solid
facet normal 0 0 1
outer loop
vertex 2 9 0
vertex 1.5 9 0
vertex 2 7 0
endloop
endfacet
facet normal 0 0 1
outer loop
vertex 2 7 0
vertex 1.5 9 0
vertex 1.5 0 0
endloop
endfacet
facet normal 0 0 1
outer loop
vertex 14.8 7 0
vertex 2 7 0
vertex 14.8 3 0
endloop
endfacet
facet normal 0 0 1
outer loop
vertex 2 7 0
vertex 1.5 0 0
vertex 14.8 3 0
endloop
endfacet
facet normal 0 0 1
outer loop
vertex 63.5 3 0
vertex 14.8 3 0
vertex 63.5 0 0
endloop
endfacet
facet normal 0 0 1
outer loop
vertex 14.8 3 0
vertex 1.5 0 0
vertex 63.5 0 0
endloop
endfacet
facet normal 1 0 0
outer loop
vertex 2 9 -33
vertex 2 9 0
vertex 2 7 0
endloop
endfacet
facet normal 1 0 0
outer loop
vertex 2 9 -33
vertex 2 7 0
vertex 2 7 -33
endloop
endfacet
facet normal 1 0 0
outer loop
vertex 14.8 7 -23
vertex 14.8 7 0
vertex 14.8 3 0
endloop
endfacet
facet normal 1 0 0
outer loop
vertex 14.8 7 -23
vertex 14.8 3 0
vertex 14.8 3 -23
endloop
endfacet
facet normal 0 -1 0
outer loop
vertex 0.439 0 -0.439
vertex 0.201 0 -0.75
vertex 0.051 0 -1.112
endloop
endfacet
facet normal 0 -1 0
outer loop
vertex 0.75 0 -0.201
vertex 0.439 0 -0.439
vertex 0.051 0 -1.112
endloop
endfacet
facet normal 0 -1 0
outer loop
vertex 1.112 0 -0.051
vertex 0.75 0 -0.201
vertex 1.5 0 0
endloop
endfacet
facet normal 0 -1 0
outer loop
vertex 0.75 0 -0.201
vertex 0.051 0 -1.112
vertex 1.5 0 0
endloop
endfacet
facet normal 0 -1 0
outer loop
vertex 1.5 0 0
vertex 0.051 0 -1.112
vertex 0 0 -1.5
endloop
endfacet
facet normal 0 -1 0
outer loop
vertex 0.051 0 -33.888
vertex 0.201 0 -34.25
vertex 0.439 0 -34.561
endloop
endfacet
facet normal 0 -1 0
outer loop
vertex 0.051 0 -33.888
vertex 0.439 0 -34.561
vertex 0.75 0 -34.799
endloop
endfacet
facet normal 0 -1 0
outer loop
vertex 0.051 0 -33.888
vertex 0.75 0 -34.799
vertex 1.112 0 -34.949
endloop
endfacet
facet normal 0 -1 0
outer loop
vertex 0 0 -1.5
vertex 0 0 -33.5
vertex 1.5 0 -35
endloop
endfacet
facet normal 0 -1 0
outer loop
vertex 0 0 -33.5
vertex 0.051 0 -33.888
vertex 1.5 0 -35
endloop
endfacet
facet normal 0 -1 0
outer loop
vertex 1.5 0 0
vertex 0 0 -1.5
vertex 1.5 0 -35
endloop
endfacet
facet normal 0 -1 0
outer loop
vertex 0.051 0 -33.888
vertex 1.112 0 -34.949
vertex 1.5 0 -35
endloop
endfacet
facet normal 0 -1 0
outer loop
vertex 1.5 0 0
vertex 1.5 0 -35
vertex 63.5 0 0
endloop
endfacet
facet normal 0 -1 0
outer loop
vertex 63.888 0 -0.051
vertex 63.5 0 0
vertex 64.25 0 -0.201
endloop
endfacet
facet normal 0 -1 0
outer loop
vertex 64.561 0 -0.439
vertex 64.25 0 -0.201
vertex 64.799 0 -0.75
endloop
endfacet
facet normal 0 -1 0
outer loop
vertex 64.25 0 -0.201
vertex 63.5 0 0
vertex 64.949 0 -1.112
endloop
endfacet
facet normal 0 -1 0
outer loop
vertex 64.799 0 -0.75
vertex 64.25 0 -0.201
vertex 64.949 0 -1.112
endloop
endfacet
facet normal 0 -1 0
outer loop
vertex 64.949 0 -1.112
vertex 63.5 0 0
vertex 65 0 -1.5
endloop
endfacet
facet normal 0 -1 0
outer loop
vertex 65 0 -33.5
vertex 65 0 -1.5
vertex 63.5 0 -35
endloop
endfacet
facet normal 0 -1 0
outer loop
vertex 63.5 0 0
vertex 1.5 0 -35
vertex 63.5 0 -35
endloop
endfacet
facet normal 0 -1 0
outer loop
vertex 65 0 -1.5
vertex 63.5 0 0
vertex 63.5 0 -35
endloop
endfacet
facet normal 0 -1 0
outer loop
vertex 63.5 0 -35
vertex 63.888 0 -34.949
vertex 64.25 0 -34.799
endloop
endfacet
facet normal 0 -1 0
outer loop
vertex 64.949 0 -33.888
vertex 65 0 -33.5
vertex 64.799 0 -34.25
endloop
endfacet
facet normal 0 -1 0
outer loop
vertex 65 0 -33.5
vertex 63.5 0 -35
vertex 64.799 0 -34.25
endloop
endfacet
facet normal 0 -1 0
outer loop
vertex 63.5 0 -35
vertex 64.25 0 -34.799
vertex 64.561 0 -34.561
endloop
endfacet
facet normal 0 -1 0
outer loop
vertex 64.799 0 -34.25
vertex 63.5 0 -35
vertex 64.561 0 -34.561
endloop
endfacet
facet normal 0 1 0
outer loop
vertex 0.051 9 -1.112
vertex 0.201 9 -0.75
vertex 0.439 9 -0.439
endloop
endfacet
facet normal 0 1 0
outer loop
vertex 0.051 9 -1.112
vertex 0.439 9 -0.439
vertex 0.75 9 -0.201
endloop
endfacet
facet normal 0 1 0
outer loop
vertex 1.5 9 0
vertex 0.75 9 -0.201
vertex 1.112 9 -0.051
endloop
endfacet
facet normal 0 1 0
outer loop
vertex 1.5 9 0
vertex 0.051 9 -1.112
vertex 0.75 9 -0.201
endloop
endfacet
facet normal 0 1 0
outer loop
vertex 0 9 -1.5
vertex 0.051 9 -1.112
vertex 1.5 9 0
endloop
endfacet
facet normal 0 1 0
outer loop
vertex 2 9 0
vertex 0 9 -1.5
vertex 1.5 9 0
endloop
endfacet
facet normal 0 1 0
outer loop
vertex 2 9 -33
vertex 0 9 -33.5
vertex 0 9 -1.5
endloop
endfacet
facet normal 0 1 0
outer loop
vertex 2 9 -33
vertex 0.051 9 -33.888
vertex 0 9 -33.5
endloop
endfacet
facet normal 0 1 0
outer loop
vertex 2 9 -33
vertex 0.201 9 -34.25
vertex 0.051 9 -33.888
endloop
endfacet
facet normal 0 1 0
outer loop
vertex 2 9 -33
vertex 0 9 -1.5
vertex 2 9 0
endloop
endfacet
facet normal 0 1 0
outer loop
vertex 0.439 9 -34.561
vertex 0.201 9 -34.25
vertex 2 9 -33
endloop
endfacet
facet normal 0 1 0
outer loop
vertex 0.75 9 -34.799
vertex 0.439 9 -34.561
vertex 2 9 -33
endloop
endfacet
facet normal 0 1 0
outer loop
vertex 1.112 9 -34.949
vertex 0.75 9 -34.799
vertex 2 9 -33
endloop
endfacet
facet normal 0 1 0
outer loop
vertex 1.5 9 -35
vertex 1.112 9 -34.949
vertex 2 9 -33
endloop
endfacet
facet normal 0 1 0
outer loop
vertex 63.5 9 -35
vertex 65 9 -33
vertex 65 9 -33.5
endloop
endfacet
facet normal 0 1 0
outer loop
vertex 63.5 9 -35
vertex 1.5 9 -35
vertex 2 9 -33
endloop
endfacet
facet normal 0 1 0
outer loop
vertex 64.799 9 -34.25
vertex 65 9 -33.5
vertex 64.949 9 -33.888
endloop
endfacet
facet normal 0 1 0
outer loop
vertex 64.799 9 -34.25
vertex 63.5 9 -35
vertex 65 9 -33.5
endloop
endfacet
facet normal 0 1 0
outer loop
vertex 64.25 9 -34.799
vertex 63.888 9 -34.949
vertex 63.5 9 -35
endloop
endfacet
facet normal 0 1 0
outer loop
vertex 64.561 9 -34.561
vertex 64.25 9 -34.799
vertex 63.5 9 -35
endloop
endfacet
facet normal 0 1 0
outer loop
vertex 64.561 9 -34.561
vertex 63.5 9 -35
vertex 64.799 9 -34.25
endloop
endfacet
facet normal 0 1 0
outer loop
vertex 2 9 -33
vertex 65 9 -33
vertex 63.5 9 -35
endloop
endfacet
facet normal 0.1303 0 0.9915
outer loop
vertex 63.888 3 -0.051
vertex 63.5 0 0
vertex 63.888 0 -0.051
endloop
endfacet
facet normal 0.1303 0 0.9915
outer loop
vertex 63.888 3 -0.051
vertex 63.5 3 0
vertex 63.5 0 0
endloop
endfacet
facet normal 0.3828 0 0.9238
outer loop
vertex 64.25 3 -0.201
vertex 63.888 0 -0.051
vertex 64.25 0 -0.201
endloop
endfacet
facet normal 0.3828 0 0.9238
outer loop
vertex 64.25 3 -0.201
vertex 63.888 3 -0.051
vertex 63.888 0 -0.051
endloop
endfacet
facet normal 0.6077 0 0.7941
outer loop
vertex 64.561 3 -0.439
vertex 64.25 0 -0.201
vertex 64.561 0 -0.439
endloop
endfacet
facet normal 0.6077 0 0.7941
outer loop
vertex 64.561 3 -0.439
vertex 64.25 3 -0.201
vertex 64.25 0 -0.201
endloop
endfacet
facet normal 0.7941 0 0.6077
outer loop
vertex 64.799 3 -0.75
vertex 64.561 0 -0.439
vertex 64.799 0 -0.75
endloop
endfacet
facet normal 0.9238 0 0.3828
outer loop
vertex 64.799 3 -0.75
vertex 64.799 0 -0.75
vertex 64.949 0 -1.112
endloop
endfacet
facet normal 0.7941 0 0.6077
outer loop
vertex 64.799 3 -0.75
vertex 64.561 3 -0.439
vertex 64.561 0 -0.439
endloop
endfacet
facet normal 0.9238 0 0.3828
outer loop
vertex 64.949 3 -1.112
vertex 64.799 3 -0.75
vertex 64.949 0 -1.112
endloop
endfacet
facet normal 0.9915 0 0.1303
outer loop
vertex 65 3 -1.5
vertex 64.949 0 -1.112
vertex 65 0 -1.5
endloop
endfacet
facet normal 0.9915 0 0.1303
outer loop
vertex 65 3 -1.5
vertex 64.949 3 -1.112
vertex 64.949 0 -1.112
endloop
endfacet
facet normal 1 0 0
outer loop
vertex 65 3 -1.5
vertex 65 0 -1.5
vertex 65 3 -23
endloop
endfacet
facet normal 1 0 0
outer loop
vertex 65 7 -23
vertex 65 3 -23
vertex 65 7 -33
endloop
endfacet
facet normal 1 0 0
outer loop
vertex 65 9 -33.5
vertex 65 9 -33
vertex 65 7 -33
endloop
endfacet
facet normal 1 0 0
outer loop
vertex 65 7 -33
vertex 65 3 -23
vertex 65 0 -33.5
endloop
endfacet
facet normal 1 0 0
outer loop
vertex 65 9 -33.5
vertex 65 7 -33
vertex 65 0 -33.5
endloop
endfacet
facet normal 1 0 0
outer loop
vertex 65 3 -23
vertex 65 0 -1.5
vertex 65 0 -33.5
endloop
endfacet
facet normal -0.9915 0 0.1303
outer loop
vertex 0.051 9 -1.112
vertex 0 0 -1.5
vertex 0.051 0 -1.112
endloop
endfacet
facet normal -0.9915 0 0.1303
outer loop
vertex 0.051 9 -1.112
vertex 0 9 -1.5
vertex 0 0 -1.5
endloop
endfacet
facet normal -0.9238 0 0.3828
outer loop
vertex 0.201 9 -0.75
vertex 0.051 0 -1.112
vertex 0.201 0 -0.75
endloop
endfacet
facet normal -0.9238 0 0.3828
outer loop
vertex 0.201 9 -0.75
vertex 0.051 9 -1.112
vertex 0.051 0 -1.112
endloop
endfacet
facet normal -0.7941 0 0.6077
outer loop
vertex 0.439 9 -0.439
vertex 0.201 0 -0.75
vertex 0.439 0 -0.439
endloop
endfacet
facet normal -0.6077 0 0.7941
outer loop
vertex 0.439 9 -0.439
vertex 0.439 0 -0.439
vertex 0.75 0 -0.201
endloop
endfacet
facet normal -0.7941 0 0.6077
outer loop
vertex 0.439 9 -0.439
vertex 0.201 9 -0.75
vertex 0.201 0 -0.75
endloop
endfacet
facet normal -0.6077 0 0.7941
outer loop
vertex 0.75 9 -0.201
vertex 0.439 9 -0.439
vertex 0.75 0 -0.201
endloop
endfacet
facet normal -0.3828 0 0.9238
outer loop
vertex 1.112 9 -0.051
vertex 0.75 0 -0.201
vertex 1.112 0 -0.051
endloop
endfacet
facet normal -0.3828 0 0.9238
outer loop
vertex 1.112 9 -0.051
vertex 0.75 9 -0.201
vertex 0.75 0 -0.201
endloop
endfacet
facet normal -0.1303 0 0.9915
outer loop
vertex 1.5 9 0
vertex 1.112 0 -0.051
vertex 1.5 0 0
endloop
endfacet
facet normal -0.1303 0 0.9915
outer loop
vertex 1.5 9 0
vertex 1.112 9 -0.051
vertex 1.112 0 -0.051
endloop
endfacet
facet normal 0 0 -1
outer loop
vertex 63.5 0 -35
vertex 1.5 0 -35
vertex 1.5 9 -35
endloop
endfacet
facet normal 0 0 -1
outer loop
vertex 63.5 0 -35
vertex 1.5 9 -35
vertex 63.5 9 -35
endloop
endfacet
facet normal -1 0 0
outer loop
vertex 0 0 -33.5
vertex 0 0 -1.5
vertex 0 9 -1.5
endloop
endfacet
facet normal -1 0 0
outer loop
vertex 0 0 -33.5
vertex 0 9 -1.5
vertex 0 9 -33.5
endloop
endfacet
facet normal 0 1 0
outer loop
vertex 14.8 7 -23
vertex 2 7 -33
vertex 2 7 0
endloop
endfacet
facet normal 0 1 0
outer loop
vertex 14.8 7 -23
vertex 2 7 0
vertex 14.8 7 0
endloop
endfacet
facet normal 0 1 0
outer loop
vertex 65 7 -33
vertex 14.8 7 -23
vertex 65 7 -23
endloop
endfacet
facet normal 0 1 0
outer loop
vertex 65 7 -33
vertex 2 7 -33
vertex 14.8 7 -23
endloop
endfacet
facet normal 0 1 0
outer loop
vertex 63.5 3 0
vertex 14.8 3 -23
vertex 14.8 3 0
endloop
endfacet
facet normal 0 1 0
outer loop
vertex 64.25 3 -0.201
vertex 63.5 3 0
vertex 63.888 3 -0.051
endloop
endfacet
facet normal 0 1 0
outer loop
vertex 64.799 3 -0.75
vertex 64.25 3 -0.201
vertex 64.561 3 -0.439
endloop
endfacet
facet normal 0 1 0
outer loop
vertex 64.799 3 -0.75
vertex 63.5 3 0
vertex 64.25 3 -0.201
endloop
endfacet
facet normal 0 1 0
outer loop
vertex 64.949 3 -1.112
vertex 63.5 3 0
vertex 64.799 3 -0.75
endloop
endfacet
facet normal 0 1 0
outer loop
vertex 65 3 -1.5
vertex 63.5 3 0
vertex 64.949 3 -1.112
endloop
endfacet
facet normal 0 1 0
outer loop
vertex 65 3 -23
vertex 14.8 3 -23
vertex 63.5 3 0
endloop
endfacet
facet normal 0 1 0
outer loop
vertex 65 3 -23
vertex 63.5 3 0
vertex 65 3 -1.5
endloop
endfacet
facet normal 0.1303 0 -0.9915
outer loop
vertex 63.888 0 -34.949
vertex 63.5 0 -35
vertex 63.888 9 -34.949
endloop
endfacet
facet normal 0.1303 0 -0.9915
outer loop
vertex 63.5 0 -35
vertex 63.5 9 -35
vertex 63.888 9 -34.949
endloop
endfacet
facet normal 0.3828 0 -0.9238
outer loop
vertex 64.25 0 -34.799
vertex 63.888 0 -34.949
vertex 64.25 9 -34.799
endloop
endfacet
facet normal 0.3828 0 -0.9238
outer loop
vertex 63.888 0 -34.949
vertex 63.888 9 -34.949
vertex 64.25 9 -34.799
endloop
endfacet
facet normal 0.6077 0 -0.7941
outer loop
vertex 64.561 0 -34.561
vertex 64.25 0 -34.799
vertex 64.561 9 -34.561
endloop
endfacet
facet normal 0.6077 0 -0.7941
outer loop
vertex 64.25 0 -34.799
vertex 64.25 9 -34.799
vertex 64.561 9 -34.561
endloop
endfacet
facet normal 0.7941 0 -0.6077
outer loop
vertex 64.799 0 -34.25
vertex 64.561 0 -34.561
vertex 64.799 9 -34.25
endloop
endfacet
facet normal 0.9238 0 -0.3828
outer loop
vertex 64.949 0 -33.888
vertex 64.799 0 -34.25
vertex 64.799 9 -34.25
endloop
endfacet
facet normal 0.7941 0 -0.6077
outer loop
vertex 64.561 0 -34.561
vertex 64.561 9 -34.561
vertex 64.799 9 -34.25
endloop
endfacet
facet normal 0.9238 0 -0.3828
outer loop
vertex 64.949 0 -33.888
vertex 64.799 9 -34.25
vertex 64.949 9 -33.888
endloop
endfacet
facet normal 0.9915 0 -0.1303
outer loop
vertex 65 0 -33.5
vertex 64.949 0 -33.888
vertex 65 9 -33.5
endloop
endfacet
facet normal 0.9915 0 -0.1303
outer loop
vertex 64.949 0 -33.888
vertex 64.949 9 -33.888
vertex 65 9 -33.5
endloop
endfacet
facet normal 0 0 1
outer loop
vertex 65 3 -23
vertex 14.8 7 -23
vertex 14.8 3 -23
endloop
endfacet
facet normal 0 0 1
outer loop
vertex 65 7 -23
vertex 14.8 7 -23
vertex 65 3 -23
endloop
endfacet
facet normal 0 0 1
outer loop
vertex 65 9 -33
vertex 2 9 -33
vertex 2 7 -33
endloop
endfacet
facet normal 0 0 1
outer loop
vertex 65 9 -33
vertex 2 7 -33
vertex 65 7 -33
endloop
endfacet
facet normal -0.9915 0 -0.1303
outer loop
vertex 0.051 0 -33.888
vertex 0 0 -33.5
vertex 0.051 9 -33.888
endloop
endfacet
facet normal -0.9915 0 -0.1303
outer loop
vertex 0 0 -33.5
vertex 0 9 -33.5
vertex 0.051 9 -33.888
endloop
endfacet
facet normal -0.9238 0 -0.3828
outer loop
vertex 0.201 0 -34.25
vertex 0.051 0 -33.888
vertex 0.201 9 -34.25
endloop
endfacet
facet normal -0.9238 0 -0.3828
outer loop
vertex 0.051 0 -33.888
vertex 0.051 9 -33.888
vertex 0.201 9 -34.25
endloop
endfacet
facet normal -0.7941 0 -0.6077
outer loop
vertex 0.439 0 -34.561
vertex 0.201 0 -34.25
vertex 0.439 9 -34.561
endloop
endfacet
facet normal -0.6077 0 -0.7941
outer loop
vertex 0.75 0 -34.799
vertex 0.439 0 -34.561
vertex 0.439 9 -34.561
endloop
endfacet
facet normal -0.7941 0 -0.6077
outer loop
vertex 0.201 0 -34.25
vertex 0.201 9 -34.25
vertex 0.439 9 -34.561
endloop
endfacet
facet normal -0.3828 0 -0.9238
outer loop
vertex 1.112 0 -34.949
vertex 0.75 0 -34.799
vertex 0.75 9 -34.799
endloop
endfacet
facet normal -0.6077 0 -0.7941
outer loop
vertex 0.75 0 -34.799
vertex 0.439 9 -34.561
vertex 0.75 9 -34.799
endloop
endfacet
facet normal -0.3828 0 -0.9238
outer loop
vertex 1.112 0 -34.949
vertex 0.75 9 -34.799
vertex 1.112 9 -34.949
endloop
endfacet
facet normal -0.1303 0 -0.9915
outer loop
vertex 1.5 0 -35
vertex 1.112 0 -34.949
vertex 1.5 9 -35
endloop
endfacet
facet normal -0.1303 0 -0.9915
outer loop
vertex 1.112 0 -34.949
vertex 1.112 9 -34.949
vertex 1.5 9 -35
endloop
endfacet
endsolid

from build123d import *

# Parameters (mm, degrees)
SKETCH1_W           = 65
SKETCH1_H           = 35
BOSS_EXTRUDE1_DEPTH = 9
SKETCH2_W           = 63
SKETCH2_H           = 33
CUT_EXTRUDE1_DEPTH  = 2
SKETCH3_W           = 50.2
SKETCH3_H           = 23
CUT_EXTRUDE2_DEPTH  = 4
FILLET1_R           = 1.5


with BuildPart() as part:
    # Sketch1 → Boss-Extrude1 (new body)
    with BuildSketch(Plane(origin=(0, 0, 0), x_dir=(1, 0, 0), z_dir=(0, 1, 0))):
        with Locations((32.5, 17.5)):
            Rectangle(SKETCH1_W, SKETCH1_H)
    extrude(amount=BOSS_EXTRUDE1_DEPTH)

    # Sketch2 → Cut-Extrude1 (cut)
    with BuildSketch(Plane(origin=(0, 9, 0), x_dir=(1, 0, 0), z_dir=(0, 1, 0))):
        with Locations((33.5, 16.5)):
            Rectangle(SKETCH2_W, SKETCH2_H)
    extrude(amount=-CUT_EXTRUDE1_DEPTH, mode=Mode.SUBTRACT)

    # Sketch3 → Cut-Extrude2 (cut)
    with BuildSketch(Plane(origin=(0, 7, 0), x_dir=(1, 0, 0), z_dir=(0, 1, 0))):
        with Locations((39.9, 11.5)):
            Rectangle(SKETCH3_W, SKETCH3_H)
    extrude(amount=-CUT_EXTRUDE2_DEPTH, mode=Mode.SUBTRACT)

    # Fillet1
    fillet1_edges = [part.edges().sort_by_distance(p)[0] for p in [
        (65, 1.5, 0),
        (0, 4.5, -35),
        (65, 4.5, -35),
        (0, 4.5, 0),
    ]]
    fillet(fillet1_edges, radius=FILLET1_R)


solid = part.part
